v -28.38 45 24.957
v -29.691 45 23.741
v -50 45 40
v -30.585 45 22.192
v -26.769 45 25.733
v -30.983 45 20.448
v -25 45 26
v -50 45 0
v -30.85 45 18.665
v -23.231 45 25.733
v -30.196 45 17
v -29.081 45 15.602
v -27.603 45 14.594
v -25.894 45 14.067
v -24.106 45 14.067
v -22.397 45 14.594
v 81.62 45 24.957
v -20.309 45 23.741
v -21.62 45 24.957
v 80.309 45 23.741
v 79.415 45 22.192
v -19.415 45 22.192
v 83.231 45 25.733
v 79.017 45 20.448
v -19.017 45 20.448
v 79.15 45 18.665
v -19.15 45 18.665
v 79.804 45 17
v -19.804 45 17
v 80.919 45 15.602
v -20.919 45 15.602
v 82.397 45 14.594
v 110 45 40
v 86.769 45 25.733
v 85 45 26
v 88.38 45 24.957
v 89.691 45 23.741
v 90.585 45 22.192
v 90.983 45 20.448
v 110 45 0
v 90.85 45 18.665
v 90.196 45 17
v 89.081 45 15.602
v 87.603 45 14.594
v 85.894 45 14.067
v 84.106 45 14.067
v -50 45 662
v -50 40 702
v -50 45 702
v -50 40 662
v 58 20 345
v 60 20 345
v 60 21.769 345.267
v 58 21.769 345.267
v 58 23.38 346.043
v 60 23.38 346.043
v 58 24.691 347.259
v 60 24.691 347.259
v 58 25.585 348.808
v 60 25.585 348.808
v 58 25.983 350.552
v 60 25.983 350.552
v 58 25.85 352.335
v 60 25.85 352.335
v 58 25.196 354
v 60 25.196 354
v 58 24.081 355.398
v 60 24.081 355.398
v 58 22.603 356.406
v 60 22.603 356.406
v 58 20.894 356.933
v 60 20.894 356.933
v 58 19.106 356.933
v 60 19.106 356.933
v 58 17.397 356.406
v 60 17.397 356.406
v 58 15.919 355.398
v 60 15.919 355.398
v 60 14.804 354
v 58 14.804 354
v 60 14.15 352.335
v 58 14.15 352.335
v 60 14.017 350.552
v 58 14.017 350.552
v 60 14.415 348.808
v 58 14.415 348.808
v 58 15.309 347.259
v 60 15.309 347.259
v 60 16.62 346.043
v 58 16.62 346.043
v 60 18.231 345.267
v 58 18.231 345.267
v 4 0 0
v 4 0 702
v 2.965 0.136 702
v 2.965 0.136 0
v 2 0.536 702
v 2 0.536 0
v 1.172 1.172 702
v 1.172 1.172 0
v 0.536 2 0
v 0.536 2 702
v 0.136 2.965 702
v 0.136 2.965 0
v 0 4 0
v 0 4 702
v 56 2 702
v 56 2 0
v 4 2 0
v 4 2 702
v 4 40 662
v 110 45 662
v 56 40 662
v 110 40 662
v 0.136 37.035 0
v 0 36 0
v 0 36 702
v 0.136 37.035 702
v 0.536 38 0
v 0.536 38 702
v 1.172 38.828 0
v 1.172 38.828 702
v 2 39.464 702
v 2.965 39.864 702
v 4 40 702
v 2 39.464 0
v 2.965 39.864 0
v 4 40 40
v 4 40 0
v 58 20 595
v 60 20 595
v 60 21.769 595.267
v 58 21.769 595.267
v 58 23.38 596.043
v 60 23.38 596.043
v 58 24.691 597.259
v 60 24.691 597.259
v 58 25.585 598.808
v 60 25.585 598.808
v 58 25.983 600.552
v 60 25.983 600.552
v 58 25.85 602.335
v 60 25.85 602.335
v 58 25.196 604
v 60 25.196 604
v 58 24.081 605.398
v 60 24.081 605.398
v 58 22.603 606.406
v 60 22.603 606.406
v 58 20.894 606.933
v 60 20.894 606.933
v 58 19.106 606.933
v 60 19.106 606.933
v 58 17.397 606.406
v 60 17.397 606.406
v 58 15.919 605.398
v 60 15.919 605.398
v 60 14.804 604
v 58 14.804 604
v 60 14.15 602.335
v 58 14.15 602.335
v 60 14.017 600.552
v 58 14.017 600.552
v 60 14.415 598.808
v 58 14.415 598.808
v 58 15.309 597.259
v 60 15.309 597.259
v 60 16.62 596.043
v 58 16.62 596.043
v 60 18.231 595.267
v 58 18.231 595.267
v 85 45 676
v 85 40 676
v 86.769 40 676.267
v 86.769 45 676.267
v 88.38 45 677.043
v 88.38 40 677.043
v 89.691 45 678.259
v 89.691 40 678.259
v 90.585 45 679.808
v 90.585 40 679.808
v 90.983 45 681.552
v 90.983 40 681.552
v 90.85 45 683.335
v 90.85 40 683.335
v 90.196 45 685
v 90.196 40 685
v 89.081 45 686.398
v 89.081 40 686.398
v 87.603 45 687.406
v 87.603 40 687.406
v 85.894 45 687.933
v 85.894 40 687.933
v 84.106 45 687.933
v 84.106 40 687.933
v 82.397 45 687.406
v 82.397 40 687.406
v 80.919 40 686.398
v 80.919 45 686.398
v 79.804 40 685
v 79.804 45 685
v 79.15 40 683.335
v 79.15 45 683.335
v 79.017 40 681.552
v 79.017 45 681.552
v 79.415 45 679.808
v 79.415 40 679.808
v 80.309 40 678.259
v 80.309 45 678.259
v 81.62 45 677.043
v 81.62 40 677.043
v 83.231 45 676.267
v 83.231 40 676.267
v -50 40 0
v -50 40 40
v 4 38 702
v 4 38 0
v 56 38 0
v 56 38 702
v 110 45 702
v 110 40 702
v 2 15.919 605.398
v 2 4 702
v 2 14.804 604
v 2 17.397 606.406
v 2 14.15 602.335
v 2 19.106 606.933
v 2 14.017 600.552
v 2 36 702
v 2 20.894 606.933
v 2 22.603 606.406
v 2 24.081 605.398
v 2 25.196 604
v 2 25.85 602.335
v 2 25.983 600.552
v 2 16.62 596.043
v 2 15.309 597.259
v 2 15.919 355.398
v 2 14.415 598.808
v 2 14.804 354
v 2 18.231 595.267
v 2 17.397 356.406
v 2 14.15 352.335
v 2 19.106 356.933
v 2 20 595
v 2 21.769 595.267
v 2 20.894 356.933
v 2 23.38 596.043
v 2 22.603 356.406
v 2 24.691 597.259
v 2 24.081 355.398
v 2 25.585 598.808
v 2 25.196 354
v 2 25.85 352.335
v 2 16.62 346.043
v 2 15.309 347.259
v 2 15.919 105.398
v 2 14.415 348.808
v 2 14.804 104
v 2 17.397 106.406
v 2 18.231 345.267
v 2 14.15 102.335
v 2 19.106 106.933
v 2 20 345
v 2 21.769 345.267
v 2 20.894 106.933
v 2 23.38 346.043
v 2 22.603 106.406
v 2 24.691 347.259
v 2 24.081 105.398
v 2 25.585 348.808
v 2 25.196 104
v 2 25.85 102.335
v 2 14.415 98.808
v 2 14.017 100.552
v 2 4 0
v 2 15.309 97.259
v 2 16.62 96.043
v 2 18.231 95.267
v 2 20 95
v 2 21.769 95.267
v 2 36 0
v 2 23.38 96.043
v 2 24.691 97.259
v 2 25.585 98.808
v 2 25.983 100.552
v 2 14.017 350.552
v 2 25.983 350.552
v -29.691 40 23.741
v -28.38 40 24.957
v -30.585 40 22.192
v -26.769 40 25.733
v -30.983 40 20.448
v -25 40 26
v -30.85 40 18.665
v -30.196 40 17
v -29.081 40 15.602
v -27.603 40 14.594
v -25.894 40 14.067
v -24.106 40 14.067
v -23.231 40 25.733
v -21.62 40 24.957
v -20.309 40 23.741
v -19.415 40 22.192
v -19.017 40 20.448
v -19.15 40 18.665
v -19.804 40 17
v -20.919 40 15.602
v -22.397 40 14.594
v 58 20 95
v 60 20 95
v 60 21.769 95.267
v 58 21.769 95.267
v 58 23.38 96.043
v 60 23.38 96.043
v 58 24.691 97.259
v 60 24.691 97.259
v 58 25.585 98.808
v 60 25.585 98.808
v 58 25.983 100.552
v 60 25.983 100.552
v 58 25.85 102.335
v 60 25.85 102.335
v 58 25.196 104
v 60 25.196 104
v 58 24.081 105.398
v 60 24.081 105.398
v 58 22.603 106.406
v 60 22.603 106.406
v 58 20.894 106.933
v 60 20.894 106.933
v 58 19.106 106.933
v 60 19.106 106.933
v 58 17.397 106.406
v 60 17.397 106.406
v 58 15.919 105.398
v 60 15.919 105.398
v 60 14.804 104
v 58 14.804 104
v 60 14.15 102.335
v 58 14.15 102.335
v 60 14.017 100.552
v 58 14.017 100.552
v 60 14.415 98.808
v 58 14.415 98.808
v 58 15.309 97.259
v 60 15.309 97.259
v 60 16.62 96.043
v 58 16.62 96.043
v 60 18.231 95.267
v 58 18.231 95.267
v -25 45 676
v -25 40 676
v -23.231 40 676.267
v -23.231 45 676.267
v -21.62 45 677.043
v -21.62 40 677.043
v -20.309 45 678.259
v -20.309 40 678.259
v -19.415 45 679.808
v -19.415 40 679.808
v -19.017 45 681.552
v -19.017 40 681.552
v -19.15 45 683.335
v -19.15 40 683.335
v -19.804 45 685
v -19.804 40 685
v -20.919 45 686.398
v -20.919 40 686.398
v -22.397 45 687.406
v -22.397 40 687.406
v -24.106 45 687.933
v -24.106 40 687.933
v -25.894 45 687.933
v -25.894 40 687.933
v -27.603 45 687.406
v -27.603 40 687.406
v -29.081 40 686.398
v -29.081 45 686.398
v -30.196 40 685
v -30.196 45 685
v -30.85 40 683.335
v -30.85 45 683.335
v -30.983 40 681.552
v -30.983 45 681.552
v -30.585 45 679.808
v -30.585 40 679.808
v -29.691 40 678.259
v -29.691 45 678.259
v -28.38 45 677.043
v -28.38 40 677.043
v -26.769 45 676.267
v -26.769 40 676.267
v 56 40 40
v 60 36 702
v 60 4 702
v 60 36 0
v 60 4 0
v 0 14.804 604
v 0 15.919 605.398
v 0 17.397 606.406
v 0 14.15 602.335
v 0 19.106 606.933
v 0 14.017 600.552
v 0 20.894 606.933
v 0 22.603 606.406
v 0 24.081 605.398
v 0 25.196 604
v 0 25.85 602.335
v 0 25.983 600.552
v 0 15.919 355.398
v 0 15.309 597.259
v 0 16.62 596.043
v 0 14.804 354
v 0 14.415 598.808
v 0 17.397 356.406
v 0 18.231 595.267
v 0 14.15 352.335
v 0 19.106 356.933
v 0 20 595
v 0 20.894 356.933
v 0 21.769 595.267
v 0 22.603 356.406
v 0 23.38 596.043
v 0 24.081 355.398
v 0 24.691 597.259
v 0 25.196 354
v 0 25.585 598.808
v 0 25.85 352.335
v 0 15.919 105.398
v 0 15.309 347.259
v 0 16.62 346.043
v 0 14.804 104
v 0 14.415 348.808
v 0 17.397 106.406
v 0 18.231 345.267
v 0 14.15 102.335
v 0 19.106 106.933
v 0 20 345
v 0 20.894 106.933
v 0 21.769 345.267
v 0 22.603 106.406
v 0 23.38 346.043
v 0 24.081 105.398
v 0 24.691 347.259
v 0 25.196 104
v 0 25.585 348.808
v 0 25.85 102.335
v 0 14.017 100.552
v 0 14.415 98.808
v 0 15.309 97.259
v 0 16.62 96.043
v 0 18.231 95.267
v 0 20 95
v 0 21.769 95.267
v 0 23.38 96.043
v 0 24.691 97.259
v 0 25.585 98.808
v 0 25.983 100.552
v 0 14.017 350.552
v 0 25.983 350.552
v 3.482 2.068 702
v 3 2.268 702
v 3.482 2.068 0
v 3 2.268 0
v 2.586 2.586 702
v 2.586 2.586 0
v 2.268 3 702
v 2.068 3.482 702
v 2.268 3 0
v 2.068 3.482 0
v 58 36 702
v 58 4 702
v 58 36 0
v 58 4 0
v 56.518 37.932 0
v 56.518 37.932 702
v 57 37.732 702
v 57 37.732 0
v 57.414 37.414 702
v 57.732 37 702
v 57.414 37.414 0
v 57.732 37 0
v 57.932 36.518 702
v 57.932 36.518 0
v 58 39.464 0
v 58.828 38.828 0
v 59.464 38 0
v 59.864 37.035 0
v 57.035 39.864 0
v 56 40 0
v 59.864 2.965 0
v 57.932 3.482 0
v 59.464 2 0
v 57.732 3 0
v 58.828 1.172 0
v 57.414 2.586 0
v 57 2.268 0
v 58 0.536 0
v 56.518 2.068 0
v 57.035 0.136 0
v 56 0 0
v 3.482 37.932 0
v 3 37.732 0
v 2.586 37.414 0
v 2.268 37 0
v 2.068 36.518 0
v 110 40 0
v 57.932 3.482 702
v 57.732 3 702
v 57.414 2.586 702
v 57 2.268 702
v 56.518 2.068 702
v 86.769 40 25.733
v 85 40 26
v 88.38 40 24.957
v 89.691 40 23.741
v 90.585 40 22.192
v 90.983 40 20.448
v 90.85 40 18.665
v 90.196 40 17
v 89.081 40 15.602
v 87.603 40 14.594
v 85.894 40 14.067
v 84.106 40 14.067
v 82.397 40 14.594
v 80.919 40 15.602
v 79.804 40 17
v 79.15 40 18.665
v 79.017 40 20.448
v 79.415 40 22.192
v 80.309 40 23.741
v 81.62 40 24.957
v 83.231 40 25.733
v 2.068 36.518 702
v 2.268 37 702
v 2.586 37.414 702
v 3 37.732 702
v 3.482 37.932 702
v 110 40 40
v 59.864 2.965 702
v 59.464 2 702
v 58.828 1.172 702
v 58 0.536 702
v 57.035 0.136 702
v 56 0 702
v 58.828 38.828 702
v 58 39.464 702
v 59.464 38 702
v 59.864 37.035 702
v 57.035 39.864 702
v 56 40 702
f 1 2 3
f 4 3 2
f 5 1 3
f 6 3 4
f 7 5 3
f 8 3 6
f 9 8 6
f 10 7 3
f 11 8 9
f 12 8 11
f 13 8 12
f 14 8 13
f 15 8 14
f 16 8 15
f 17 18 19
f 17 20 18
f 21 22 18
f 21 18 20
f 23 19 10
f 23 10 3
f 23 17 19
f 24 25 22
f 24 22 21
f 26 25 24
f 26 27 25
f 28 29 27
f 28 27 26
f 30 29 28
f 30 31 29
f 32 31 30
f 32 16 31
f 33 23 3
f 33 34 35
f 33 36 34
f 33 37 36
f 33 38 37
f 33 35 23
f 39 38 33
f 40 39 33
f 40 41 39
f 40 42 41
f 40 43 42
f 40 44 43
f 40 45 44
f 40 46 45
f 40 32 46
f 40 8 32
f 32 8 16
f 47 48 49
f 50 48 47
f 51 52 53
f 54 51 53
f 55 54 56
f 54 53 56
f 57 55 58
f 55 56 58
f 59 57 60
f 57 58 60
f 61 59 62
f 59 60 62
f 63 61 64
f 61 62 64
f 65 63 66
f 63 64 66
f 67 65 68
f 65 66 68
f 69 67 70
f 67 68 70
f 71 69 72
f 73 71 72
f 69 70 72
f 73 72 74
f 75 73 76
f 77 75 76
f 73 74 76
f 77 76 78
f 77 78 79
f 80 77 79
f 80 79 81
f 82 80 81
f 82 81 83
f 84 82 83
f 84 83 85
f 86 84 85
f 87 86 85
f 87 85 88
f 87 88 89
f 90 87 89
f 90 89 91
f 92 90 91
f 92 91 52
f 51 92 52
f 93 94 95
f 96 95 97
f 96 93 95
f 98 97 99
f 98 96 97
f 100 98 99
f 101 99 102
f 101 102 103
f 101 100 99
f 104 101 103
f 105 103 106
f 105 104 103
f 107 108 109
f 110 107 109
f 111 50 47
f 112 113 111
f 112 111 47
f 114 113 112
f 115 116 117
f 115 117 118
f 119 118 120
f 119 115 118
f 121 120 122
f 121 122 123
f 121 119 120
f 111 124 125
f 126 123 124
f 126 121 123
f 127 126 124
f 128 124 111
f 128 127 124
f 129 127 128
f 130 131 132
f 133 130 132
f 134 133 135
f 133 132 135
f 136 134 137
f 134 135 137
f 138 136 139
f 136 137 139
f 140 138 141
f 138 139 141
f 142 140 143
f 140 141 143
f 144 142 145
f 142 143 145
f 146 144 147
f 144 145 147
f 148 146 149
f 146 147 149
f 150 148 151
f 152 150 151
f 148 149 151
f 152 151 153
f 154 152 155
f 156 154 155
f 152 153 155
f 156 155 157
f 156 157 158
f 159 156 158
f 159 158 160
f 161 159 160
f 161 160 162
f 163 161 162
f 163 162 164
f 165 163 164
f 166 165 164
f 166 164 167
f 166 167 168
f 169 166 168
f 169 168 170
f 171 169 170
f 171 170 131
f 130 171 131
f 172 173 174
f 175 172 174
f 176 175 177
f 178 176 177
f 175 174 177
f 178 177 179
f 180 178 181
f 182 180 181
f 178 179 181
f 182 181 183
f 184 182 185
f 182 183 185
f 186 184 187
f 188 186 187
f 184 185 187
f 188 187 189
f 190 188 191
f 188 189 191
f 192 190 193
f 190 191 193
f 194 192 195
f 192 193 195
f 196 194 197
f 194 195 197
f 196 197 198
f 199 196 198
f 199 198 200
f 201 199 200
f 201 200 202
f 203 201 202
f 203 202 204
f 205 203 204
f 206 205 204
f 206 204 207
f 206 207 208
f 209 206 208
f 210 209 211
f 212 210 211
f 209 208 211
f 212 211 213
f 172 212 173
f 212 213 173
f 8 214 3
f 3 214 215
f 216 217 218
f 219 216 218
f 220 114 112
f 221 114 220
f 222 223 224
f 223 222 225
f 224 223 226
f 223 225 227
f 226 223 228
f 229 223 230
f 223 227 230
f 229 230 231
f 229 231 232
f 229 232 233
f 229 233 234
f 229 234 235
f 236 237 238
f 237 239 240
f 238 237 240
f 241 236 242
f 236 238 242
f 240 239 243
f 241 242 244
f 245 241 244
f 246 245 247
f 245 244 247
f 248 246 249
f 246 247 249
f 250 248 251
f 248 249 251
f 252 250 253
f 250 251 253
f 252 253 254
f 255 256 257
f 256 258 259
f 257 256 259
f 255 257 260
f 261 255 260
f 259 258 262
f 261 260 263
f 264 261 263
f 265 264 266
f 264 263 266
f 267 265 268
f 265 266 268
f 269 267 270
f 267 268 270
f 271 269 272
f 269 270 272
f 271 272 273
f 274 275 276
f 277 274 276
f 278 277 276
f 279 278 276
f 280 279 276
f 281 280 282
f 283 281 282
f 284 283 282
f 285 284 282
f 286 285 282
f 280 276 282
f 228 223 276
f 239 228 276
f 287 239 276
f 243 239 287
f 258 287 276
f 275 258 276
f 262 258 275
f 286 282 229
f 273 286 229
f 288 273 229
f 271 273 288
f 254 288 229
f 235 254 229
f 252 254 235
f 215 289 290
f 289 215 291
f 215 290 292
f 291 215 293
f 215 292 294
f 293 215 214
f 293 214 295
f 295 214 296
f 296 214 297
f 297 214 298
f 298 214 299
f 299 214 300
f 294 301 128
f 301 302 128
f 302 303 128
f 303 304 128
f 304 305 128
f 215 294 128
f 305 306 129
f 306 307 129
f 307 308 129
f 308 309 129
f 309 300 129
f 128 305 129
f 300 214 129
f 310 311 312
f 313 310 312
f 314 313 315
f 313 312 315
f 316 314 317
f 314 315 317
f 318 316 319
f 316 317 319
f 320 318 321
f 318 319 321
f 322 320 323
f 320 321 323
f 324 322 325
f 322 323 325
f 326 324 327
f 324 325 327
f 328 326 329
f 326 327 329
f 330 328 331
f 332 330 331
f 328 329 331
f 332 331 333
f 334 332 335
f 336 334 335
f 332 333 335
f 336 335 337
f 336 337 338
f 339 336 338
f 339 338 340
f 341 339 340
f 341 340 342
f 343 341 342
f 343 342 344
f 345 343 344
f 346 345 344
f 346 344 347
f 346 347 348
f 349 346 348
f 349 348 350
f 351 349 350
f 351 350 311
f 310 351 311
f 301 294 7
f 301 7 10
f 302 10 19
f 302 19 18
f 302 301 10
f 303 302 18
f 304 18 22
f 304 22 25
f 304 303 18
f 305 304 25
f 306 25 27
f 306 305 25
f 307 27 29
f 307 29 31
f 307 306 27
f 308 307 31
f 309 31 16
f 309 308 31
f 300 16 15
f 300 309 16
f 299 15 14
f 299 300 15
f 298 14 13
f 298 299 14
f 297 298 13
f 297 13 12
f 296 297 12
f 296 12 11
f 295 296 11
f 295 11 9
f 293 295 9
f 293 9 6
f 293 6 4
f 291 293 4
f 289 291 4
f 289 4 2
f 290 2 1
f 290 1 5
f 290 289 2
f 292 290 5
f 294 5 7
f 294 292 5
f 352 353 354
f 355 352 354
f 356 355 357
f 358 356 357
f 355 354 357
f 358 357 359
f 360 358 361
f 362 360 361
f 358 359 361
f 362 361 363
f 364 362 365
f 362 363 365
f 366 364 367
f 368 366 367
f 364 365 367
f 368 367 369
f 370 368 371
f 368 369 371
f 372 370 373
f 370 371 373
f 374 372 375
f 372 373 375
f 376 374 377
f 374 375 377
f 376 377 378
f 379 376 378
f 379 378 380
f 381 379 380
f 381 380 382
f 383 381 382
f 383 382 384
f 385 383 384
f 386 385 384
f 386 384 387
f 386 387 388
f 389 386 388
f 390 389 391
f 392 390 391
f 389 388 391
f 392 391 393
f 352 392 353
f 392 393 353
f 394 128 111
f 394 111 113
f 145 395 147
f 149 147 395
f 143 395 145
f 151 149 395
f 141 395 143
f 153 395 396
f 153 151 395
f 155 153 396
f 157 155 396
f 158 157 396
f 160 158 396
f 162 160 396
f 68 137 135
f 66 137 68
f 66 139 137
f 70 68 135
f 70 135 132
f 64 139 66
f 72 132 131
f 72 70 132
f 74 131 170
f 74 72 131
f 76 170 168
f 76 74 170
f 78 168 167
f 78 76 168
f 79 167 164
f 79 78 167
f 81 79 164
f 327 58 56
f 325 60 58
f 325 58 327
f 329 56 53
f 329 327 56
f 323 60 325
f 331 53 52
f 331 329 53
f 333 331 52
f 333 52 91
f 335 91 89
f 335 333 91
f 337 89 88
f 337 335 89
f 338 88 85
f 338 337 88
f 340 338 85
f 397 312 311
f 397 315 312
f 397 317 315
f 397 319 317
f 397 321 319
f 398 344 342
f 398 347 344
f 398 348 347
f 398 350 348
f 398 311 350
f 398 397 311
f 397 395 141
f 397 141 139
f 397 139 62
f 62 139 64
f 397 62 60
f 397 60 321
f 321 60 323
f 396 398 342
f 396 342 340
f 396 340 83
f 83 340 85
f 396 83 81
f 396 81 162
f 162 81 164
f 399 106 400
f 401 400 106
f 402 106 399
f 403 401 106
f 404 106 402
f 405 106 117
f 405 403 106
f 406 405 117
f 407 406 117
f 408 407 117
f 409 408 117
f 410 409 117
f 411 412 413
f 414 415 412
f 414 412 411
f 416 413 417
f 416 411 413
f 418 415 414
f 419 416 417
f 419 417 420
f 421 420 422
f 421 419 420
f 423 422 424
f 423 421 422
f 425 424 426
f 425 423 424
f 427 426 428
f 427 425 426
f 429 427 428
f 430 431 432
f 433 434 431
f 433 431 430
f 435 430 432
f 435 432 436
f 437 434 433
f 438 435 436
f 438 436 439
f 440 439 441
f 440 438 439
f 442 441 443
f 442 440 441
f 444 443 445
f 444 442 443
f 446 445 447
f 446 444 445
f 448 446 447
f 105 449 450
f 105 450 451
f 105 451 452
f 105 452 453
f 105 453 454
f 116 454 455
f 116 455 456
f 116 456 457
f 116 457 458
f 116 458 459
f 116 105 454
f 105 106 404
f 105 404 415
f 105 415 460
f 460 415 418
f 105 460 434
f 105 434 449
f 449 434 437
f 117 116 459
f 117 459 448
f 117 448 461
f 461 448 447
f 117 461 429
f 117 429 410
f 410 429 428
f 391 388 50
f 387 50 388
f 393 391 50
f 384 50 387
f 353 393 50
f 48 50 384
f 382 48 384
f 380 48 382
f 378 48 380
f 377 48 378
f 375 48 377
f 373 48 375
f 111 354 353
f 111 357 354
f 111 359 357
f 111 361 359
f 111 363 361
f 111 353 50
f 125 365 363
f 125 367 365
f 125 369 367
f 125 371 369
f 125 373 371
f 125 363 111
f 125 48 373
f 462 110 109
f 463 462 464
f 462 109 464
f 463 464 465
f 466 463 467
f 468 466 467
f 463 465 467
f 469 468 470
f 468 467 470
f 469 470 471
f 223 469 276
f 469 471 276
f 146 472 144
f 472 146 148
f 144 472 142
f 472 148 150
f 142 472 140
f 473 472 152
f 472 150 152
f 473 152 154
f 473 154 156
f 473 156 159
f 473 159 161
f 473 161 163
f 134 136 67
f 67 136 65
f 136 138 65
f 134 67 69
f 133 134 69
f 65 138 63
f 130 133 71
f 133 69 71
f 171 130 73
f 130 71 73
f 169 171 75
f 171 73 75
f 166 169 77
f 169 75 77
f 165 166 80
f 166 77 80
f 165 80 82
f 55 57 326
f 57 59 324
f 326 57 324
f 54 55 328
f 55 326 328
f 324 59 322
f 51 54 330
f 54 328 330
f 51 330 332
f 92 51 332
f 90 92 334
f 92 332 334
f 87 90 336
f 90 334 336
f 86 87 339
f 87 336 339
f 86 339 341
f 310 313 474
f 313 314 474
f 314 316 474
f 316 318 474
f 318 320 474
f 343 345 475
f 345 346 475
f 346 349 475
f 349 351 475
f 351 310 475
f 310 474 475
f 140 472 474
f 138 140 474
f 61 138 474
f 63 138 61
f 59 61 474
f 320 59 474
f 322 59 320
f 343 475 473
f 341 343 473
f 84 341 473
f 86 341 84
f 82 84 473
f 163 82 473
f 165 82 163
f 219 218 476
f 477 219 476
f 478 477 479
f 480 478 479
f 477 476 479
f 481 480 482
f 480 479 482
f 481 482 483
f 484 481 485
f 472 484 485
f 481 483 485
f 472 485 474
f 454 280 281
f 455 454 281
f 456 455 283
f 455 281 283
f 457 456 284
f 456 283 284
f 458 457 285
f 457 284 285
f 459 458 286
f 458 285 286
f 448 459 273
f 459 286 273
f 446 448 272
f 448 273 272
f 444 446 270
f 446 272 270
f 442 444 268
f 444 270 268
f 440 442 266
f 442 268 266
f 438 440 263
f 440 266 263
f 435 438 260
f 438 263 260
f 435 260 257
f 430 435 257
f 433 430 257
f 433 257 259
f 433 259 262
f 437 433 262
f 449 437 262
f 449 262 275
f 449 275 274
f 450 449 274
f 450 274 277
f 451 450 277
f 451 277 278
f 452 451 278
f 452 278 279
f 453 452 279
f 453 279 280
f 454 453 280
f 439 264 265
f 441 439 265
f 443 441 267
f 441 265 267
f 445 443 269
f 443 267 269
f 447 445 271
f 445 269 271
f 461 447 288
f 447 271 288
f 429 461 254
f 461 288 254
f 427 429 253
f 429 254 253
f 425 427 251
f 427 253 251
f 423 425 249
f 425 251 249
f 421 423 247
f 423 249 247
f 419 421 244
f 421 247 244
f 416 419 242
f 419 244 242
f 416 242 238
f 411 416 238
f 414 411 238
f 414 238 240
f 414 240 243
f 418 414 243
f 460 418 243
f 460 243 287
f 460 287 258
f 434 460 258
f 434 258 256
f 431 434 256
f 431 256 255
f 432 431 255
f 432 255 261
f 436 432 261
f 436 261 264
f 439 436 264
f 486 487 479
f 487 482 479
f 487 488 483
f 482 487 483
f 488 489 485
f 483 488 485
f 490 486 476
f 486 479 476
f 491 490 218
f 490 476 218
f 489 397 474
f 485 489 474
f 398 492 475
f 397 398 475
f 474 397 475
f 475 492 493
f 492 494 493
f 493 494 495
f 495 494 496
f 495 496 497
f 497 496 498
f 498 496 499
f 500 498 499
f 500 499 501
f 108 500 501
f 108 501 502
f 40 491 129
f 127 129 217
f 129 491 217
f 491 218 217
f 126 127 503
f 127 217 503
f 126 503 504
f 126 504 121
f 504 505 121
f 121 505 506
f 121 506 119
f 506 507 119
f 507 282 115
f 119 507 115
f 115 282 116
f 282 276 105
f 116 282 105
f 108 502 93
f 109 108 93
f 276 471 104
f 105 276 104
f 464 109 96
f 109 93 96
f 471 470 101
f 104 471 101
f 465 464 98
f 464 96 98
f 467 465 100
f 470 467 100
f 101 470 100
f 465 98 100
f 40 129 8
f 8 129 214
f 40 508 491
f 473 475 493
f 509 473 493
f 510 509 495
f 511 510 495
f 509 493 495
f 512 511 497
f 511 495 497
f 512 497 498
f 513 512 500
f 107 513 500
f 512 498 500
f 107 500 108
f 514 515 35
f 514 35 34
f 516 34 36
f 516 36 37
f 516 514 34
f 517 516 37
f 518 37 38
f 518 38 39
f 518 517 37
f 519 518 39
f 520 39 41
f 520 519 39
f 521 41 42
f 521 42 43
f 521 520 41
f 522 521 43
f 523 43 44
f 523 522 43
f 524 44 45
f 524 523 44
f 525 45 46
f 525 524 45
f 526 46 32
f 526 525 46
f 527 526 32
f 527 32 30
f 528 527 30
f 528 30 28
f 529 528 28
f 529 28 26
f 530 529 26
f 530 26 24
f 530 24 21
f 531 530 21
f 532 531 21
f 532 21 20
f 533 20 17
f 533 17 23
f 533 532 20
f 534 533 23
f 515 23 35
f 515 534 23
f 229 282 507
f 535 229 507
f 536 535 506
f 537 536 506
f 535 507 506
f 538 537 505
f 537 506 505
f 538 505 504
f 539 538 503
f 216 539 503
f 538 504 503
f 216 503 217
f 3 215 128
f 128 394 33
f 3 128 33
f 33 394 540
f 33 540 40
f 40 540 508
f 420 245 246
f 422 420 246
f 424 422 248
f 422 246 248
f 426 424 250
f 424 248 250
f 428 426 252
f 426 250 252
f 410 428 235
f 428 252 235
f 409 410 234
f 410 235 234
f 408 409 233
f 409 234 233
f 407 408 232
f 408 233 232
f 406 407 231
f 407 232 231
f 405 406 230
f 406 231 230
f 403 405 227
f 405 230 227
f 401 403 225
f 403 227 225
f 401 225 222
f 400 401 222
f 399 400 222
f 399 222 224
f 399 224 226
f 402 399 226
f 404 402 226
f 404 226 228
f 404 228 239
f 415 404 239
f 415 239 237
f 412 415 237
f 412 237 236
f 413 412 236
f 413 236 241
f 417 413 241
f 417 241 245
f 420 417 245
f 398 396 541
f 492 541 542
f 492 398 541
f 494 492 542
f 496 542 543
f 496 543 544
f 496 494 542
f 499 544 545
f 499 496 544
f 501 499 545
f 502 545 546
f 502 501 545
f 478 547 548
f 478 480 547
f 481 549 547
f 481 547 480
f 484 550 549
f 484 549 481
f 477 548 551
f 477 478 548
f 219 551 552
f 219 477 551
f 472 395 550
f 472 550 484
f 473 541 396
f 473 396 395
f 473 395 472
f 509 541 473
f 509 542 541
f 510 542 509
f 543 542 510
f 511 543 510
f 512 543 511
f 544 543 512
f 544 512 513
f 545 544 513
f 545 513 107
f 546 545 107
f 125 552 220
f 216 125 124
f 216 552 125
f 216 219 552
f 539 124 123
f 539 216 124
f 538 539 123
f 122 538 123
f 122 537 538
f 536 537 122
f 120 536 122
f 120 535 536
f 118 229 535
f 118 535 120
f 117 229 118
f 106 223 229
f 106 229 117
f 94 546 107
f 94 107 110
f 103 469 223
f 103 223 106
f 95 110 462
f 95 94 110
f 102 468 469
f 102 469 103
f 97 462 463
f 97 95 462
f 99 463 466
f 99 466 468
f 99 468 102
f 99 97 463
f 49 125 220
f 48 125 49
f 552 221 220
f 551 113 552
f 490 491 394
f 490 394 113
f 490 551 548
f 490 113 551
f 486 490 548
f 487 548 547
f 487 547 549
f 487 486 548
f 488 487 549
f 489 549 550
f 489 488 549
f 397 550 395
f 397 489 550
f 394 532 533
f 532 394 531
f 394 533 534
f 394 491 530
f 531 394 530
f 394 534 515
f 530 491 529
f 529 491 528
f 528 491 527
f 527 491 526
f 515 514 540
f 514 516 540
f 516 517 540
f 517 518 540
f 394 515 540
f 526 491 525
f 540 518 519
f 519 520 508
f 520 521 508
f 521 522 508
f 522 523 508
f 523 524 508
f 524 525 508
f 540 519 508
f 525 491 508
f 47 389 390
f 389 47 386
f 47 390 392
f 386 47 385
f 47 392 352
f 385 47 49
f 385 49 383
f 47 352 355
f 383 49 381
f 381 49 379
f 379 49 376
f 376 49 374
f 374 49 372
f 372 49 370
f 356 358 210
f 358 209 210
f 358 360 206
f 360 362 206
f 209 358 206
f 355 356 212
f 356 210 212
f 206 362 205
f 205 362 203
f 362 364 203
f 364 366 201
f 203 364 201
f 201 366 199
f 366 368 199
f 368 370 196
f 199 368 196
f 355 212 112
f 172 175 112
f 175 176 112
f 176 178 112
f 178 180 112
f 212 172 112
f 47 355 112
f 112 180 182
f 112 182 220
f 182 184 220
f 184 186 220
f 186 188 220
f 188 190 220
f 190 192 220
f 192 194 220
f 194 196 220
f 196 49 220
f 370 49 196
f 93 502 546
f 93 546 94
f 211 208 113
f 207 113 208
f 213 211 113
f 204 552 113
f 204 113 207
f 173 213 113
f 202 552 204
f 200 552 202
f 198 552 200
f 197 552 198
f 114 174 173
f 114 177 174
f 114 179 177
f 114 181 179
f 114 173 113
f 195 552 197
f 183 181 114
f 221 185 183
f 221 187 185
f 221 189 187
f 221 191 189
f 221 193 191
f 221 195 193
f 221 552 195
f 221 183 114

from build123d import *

# Parameters (mm, degrees)
DODANIE_WYCI_GNI_CIE1_DEPTH = 702
SZKIC2_R                    = 6
DODANIE_WYCI_GNI_CIE2_DEPTH = 5
SZKIC4_R                    = 6
WYTNIJ_WYCI_GNI_CIE1_DEPTH  = 65


with BuildPart() as part:
    # Szkic1 → Dodanie-wyciągnięcie1 (new body)
    with BuildSketch(Plane.XY):
        with BuildLine():
            Line((0, 4), (0, 36))
            ThreePointArc((0, 36), (1.171572875, 38.828427125), (4, 40))
            Line((4, 40), (56, 40))
            ThreePointArc((56, 40), (58.828427125, 38.828427125), (60, 36))
            Line((60, 36), (60, 4))
            ThreePointArc((60, 4), (58.828427125, 1.171572875), (56, 0))
            Line((56, 0), (4, 0))
            ThreePointArc((4, 0), (1.171572875, 1.171572875), (0, 4))
        make_face()
        with BuildLine():
            Line((2, 4), (2, 36))
            ThreePointArc((2, 36), (2.585786438, 37.414213562), (4, 38))
            Line((4, 38), (56, 38))
            ThreePointArc((56, 38), (57.414213562, 37.414213562), (58, 36))
            Line((58, 36), (58, 4))
            ThreePointArc((58, 4), (57.414213562, 2.585786438), (56, 2))
            Line((56, 2), (4, 2))
            ThreePointArc((4, 2), (2.585786438, 2.585786438), (2, 4))
        make_face(mode=Mode.SUBTRACT)
    extrude(amount=DODANIE_WYCI_GNI_CIE1_DEPTH)

    # Szkic2 → Dodanie-wyciągnięcie2 (add)
    with BuildSketch(Plane(origin=(0, 40, 0), x_dir=(1, 0, 0), z_dir=(0, 1, 0))):
        Polygon((0, 0), (-50, 0), (-50, -40), (110, -40), (110, 0), align=None)
        with Locations(Location((-25, -20, 0), (0, 0, 270))):
            Circle(SZKIC2_R, mode=Mode.SUBTRACT)
        with Locations(Location((85, -20, 0), (0, 0, 270))):
            Circle(SZKIC2_R, mode=Mode.SUBTRACT)
    dodanie_wyci_gni_cie2 = extrude(amount=DODANIE_WYCI_GNI_CIE2_DEPTH)

    # Lustro1: Dodanie-wyciągnięcie2 across plane
    add(dodanie_wyci_gni_cie2.mirror(Plane(origin=(0, 0, 351), x_dir=(1, 0, 0), z_dir=(0, 0, -1))))

    # Szkic4 → Wytnij-wyciągnięcie1 (cut)
    with BuildSketch(Plane(origin=(60, 0, 0), x_dir=(0, 0, -1), z_dir=(1, 0, 0))):
        with Locations((-101, 20)):
            Circle(SZKIC4_R)
        with Locations((-351, 20)):
            Circle(SZKIC4_R)
        with Locations((-601, 20)):
            Circle(SZKIC4_R)
    extrude(amount=-WYTNIJ_WYCI_GNI_CIE1_DEPTH, mode=Mode.SUBTRACT)


solid = part.part
